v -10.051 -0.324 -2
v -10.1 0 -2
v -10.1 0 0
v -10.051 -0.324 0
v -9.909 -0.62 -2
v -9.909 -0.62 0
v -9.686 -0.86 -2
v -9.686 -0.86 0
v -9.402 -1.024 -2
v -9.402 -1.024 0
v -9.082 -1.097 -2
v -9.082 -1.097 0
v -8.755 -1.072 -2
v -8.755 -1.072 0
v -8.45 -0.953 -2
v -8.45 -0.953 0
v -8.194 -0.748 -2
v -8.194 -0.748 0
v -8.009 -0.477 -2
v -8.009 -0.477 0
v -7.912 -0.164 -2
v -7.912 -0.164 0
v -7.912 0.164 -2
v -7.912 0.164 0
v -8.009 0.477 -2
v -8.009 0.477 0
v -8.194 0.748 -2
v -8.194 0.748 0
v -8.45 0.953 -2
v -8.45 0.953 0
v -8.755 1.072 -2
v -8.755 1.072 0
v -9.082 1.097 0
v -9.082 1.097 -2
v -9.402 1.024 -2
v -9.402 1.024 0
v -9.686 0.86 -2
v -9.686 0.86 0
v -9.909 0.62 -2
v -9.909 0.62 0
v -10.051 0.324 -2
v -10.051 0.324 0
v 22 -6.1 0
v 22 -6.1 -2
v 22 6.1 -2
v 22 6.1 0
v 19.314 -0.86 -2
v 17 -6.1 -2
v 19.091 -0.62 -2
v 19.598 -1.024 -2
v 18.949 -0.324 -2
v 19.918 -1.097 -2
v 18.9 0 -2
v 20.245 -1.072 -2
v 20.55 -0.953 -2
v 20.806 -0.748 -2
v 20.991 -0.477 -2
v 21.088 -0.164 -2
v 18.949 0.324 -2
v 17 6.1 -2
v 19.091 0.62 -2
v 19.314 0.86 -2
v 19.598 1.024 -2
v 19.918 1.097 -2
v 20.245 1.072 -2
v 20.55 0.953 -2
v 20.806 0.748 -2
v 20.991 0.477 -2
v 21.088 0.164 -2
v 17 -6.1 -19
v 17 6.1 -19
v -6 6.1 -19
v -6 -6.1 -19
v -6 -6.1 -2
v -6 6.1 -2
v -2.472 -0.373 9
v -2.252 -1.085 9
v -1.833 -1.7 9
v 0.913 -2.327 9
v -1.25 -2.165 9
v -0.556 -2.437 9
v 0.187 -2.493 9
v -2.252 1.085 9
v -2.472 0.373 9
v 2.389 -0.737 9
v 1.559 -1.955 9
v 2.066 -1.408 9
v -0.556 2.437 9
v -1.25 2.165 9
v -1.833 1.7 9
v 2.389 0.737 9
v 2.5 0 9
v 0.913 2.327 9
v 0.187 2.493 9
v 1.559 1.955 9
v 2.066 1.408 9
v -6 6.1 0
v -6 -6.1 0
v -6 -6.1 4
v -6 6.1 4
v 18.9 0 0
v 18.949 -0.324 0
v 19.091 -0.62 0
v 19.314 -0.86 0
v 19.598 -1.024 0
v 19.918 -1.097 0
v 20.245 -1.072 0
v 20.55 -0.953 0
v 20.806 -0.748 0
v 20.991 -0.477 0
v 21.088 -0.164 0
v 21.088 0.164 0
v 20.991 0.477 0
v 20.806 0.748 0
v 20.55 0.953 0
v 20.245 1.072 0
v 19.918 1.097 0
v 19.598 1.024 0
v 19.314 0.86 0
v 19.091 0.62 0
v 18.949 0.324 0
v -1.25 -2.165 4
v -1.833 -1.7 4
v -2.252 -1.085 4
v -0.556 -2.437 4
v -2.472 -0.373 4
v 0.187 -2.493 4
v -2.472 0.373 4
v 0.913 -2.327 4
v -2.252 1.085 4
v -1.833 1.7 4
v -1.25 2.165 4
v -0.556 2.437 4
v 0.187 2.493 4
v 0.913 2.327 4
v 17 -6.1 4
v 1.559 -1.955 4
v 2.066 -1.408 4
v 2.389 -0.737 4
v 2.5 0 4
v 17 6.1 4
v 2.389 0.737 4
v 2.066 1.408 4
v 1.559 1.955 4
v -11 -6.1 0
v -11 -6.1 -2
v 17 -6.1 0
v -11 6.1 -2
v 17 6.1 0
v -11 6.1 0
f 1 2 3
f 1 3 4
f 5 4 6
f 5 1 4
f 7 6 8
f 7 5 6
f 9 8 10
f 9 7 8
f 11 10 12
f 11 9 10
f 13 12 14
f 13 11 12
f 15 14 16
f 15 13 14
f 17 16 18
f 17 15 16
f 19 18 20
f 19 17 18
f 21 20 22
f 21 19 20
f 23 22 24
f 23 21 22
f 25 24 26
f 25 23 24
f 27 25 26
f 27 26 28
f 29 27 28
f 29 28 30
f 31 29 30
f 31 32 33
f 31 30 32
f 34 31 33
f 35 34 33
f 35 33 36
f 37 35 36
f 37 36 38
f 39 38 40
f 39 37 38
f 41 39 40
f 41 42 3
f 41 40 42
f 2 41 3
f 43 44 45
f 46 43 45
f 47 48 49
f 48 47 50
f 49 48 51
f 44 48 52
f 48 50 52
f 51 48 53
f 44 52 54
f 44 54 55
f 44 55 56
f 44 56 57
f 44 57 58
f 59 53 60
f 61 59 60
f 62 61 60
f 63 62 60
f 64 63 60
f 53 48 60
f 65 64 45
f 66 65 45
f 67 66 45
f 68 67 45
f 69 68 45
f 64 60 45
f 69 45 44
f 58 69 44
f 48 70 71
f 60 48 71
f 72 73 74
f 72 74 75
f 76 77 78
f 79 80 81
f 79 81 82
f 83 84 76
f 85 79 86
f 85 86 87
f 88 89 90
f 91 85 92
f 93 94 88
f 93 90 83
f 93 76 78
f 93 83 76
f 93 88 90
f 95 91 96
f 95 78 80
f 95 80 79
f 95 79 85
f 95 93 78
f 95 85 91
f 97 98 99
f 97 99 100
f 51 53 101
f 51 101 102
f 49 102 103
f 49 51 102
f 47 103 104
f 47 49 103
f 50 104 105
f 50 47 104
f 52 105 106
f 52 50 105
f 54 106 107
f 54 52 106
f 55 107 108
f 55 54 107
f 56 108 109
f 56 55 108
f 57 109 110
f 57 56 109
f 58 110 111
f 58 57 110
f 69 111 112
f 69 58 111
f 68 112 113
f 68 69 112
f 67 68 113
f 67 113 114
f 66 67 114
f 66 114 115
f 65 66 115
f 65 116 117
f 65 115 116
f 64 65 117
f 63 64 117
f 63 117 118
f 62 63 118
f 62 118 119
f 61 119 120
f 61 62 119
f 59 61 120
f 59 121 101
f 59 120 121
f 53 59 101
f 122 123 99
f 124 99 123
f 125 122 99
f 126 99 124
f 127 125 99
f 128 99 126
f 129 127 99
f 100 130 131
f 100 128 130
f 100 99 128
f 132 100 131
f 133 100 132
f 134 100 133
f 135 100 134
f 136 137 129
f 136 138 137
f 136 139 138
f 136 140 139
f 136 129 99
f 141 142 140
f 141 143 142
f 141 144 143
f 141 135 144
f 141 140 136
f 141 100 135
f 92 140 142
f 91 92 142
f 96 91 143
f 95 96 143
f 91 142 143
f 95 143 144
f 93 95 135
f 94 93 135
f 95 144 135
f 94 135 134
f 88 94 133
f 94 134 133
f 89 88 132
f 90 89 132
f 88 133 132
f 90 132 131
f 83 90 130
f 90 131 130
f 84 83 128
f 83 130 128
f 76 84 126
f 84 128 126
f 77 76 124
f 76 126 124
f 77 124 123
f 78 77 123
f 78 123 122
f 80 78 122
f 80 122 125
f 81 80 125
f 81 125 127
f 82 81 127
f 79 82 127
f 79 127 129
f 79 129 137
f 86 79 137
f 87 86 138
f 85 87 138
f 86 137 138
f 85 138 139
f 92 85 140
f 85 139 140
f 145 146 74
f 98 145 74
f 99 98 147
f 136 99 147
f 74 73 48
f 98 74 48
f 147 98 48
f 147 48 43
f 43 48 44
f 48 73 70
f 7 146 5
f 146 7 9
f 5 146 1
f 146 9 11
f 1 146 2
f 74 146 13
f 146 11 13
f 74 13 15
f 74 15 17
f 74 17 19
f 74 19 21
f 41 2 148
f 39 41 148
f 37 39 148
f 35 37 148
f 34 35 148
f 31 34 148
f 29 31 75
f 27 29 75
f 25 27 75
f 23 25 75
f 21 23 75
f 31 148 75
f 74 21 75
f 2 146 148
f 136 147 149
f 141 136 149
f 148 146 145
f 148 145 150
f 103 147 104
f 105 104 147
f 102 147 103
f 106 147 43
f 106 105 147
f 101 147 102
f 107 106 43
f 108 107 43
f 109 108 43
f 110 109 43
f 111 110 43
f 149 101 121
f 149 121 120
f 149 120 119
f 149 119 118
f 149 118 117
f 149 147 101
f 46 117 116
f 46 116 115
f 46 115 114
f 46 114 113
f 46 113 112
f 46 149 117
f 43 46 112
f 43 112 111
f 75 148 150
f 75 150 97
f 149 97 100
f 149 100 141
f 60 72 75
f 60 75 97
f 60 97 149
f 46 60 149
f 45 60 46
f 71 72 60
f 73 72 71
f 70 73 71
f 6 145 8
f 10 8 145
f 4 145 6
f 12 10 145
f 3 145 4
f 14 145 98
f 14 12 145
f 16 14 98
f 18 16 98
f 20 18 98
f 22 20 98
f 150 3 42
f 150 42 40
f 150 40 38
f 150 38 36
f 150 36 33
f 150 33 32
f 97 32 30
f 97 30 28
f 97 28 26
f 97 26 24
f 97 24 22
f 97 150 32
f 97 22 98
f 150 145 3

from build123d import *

# Parameters (mm, degrees)
CASE_23X12P2X23_START                = -19
CASE_23X12P2X23_PROFILE_W            = 23
CASE_23X12P2X23_PROFILE_H            = 12.2
CASE_23X12P2X23_DEPTH                = 23
MOUNTING_EARS_33X12P2_START          = -2
MOUNTING_EARS_33X12P2_PROFILE_W      = 33
MOUNTING_EARS_33X12P2_PROFILE_H      = 12.2
MOUNTING_EARS_33X12P2_DEPTH          = 2
OUTPUT_ENVELOPE_NOT_SPLINE_START     = 4
OUTPUT_ENVELOPE_NOT_SPLINE_PROFILE_R = 2.5
OUTPUT_ENVELOPE_NOT_SPLINE_DEPTH     = 5
MOUNTING_HOLES_NOMINAL_START         = -50
MOUNTING_HOLES_NOMINAL_PROFILE_R     = 1.1
MOUNTING_HOLES_NOMINAL_DEPTH         = 80.702020133


with BuildPart() as part:
    # Case_23x12p2x23_profile → Case_23x12p2x23 (new body)
    with BuildSketch(Plane.XY.offset(CASE_23X12P2X23_START)):
        with Locations((5.5, 0)):
            Rectangle(CASE_23X12P2X23_PROFILE_W, CASE_23X12P2X23_PROFILE_H)
    extrude(amount=CASE_23X12P2X23_DEPTH)

    # Mounting_ears_33x12p2_profile → Mounting_ears_33x12p2 (add)
    with BuildSketch(Plane.XY.offset(MOUNTING_EARS_33X12P2_START)):
        with Locations((5.5, 0)):
            Rectangle(MOUNTING_EARS_33X12P2_PROFILE_W, MOUNTING_EARS_33X12P2_PROFILE_H)
    extrude(amount=MOUNTING_EARS_33X12P2_DEPTH)

    # Output_envelope_not_spline_profile → Output_envelope_not_spline (add)
    with BuildSketch(Plane.XY.offset(OUTPUT_ENVELOPE_NOT_SPLINE_START)):
        Circle(OUTPUT_ENVELOPE_NOT_SPLINE_PROFILE_R)
    extrude(amount=OUTPUT_ENVELOPE_NOT_SPLINE_DEPTH)

    # Mounting_holes_nominal_profile → Mounting_holes_nominal (cut, through all)
    with BuildSketch(Plane.XY.offset(MOUNTING_HOLES_NOMINAL_START)):
        with Locations(Location((-9, 0, 0), (0, 0, 180))):
            Circle(MOUNTING_HOLES_NOMINAL_PROFILE_R)
        with Locations(Location((20, 0, 0), (0, 0, 180))):
            Circle(MOUNTING_HOLES_NOMINAL_PROFILE_R)
    extrude(amount=MOUNTING_HOLES_NOMINAL_DEPTH, mode=Mode.SUBTRACT)


solid = part.part
